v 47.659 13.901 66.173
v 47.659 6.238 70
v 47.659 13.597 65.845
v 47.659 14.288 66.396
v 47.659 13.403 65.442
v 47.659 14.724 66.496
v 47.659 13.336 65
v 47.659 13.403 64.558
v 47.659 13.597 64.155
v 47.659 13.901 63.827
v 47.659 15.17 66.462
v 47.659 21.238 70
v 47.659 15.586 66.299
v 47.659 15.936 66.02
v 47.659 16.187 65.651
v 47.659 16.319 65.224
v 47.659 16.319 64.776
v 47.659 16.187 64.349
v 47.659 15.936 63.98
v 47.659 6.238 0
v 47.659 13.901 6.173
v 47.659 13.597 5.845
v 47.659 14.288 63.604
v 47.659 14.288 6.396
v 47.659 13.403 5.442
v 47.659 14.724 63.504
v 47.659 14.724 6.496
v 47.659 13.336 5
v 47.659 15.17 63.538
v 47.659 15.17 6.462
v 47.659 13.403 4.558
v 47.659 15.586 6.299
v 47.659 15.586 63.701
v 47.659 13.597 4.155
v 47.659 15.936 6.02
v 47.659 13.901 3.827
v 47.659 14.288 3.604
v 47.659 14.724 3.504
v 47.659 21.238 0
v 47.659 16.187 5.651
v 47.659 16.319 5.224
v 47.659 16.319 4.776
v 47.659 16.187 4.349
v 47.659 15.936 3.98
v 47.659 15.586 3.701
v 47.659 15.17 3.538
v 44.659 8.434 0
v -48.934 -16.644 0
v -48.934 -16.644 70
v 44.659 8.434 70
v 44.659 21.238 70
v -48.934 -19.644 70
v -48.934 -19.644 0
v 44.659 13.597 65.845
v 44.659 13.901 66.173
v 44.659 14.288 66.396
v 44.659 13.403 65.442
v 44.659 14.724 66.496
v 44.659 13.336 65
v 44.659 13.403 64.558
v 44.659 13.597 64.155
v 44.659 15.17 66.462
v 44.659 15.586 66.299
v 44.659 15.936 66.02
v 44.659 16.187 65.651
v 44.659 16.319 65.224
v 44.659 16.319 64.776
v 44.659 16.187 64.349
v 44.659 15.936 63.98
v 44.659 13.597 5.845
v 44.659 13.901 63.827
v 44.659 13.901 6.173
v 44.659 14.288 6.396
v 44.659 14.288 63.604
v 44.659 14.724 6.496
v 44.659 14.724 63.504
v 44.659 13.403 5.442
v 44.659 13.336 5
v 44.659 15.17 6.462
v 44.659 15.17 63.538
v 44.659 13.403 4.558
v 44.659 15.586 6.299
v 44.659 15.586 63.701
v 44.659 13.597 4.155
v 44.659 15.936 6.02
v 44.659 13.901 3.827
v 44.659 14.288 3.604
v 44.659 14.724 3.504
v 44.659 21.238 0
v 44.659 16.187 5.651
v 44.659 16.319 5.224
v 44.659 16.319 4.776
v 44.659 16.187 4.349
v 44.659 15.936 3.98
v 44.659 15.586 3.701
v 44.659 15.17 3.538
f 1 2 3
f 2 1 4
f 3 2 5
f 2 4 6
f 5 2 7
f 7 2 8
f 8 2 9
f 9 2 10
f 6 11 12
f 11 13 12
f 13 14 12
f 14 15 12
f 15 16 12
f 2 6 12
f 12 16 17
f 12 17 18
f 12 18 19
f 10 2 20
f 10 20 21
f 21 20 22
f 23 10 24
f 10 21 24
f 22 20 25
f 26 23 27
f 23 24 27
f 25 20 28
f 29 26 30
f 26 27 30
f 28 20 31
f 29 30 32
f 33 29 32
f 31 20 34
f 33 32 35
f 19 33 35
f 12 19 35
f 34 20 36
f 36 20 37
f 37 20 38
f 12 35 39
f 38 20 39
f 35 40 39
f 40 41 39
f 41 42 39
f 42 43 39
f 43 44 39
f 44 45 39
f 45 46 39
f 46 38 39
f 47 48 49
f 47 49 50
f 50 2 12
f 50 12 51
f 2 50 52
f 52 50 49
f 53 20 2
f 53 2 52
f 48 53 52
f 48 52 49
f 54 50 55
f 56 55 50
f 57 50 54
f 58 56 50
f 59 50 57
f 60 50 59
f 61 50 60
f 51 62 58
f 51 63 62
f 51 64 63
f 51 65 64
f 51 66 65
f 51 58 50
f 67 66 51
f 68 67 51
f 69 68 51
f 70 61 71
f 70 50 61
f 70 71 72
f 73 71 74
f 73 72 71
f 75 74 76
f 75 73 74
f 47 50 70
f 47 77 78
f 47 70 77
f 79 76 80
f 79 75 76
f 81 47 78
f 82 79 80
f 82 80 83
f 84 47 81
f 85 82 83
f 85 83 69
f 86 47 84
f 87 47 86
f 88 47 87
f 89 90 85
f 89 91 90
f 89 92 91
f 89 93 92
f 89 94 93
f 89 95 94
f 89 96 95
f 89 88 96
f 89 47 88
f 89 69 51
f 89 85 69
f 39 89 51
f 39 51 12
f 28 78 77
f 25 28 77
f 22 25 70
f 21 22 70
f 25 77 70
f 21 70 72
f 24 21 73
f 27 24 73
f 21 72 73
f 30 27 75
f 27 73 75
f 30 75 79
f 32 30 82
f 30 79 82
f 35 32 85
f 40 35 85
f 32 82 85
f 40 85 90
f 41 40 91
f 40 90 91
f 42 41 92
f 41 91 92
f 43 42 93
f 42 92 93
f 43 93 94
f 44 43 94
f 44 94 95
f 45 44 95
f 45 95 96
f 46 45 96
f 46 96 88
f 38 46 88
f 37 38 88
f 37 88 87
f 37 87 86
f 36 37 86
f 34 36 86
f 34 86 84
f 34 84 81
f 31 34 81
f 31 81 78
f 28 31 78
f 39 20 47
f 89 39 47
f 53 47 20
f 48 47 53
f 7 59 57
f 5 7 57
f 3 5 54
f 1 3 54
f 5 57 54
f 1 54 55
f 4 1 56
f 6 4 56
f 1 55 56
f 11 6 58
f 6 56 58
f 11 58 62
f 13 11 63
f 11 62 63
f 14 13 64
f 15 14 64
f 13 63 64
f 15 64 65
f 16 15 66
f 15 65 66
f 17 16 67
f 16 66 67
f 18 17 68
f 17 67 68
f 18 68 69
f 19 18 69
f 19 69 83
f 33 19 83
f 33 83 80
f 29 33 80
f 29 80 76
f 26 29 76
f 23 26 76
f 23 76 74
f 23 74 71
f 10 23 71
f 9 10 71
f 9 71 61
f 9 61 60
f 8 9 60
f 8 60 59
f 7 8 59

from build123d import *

# Parameters (mm, degrees)
EXTRUDE_1_DEPTH     = 70
CUT_EXTRUDE_1_REACH = 120.788
SKETCH_2_R          = 1.5


with BuildPart() as part:
    # 草图1 → 凸台-拉伸1 (new body)
    with BuildSketch(Plane.XY):
        Polygon((47.658749939, 6.237878975), (-48.93383269, -19.644025535), (-48.93383269, -16.644025535), (44.658749939, 8.434031398), (44.658749939, 21.237878975), (47.658749939, 21.237878975), (47.658749939, 9.237878975), align=None)
    extrude(amount=EXTRUDE_1_DEPTH)

    # 草图2 → 切除-拉伸1 (cut, up to next)
    with BuildSketch(Plane.ZY.offset(-44.658749939), mode=Mode.PRIVATE) as cut_extrude_1_sk1:
        with Locations(Location((5, 14.835955186, 0), (0, 0, 270))):
            Circle(SKETCH_2_R)
    cut_extrude_1_tool1 = extrude(cut_extrude_1_sk1.sketch, amount=-CUT_EXTRUDE_1_REACH, mode=Mode.PRIVATE) & part.part
    # 草图2 → 切除-拉伸1 (cut, up to next)
    with BuildSketch(Plane.ZY.offset(-44.658749939), mode=Mode.PRIVATE) as cut_extrude_1_sk2:
        with Locations(Location((65, 14.835955186, 0), (0, 0, 270))):
            Circle(SKETCH_2_R)
    cut_extrude_1_tool2 = extrude(cut_extrude_1_sk2.sketch, amount=-CUT_EXTRUDE_1_REACH, mode=Mode.PRIVATE) & part.part
    add(cut_extrude_1_tool1.solids().sort_by_distance((44.65875, 14.835955, 5))[0], mode=Mode.SUBTRACT)
    add(cut_extrude_1_tool2.solids().sort_by_distance((44.65875, 14.835955, 65))[0], mode=Mode.SUBTRACT)


solid = part.part
